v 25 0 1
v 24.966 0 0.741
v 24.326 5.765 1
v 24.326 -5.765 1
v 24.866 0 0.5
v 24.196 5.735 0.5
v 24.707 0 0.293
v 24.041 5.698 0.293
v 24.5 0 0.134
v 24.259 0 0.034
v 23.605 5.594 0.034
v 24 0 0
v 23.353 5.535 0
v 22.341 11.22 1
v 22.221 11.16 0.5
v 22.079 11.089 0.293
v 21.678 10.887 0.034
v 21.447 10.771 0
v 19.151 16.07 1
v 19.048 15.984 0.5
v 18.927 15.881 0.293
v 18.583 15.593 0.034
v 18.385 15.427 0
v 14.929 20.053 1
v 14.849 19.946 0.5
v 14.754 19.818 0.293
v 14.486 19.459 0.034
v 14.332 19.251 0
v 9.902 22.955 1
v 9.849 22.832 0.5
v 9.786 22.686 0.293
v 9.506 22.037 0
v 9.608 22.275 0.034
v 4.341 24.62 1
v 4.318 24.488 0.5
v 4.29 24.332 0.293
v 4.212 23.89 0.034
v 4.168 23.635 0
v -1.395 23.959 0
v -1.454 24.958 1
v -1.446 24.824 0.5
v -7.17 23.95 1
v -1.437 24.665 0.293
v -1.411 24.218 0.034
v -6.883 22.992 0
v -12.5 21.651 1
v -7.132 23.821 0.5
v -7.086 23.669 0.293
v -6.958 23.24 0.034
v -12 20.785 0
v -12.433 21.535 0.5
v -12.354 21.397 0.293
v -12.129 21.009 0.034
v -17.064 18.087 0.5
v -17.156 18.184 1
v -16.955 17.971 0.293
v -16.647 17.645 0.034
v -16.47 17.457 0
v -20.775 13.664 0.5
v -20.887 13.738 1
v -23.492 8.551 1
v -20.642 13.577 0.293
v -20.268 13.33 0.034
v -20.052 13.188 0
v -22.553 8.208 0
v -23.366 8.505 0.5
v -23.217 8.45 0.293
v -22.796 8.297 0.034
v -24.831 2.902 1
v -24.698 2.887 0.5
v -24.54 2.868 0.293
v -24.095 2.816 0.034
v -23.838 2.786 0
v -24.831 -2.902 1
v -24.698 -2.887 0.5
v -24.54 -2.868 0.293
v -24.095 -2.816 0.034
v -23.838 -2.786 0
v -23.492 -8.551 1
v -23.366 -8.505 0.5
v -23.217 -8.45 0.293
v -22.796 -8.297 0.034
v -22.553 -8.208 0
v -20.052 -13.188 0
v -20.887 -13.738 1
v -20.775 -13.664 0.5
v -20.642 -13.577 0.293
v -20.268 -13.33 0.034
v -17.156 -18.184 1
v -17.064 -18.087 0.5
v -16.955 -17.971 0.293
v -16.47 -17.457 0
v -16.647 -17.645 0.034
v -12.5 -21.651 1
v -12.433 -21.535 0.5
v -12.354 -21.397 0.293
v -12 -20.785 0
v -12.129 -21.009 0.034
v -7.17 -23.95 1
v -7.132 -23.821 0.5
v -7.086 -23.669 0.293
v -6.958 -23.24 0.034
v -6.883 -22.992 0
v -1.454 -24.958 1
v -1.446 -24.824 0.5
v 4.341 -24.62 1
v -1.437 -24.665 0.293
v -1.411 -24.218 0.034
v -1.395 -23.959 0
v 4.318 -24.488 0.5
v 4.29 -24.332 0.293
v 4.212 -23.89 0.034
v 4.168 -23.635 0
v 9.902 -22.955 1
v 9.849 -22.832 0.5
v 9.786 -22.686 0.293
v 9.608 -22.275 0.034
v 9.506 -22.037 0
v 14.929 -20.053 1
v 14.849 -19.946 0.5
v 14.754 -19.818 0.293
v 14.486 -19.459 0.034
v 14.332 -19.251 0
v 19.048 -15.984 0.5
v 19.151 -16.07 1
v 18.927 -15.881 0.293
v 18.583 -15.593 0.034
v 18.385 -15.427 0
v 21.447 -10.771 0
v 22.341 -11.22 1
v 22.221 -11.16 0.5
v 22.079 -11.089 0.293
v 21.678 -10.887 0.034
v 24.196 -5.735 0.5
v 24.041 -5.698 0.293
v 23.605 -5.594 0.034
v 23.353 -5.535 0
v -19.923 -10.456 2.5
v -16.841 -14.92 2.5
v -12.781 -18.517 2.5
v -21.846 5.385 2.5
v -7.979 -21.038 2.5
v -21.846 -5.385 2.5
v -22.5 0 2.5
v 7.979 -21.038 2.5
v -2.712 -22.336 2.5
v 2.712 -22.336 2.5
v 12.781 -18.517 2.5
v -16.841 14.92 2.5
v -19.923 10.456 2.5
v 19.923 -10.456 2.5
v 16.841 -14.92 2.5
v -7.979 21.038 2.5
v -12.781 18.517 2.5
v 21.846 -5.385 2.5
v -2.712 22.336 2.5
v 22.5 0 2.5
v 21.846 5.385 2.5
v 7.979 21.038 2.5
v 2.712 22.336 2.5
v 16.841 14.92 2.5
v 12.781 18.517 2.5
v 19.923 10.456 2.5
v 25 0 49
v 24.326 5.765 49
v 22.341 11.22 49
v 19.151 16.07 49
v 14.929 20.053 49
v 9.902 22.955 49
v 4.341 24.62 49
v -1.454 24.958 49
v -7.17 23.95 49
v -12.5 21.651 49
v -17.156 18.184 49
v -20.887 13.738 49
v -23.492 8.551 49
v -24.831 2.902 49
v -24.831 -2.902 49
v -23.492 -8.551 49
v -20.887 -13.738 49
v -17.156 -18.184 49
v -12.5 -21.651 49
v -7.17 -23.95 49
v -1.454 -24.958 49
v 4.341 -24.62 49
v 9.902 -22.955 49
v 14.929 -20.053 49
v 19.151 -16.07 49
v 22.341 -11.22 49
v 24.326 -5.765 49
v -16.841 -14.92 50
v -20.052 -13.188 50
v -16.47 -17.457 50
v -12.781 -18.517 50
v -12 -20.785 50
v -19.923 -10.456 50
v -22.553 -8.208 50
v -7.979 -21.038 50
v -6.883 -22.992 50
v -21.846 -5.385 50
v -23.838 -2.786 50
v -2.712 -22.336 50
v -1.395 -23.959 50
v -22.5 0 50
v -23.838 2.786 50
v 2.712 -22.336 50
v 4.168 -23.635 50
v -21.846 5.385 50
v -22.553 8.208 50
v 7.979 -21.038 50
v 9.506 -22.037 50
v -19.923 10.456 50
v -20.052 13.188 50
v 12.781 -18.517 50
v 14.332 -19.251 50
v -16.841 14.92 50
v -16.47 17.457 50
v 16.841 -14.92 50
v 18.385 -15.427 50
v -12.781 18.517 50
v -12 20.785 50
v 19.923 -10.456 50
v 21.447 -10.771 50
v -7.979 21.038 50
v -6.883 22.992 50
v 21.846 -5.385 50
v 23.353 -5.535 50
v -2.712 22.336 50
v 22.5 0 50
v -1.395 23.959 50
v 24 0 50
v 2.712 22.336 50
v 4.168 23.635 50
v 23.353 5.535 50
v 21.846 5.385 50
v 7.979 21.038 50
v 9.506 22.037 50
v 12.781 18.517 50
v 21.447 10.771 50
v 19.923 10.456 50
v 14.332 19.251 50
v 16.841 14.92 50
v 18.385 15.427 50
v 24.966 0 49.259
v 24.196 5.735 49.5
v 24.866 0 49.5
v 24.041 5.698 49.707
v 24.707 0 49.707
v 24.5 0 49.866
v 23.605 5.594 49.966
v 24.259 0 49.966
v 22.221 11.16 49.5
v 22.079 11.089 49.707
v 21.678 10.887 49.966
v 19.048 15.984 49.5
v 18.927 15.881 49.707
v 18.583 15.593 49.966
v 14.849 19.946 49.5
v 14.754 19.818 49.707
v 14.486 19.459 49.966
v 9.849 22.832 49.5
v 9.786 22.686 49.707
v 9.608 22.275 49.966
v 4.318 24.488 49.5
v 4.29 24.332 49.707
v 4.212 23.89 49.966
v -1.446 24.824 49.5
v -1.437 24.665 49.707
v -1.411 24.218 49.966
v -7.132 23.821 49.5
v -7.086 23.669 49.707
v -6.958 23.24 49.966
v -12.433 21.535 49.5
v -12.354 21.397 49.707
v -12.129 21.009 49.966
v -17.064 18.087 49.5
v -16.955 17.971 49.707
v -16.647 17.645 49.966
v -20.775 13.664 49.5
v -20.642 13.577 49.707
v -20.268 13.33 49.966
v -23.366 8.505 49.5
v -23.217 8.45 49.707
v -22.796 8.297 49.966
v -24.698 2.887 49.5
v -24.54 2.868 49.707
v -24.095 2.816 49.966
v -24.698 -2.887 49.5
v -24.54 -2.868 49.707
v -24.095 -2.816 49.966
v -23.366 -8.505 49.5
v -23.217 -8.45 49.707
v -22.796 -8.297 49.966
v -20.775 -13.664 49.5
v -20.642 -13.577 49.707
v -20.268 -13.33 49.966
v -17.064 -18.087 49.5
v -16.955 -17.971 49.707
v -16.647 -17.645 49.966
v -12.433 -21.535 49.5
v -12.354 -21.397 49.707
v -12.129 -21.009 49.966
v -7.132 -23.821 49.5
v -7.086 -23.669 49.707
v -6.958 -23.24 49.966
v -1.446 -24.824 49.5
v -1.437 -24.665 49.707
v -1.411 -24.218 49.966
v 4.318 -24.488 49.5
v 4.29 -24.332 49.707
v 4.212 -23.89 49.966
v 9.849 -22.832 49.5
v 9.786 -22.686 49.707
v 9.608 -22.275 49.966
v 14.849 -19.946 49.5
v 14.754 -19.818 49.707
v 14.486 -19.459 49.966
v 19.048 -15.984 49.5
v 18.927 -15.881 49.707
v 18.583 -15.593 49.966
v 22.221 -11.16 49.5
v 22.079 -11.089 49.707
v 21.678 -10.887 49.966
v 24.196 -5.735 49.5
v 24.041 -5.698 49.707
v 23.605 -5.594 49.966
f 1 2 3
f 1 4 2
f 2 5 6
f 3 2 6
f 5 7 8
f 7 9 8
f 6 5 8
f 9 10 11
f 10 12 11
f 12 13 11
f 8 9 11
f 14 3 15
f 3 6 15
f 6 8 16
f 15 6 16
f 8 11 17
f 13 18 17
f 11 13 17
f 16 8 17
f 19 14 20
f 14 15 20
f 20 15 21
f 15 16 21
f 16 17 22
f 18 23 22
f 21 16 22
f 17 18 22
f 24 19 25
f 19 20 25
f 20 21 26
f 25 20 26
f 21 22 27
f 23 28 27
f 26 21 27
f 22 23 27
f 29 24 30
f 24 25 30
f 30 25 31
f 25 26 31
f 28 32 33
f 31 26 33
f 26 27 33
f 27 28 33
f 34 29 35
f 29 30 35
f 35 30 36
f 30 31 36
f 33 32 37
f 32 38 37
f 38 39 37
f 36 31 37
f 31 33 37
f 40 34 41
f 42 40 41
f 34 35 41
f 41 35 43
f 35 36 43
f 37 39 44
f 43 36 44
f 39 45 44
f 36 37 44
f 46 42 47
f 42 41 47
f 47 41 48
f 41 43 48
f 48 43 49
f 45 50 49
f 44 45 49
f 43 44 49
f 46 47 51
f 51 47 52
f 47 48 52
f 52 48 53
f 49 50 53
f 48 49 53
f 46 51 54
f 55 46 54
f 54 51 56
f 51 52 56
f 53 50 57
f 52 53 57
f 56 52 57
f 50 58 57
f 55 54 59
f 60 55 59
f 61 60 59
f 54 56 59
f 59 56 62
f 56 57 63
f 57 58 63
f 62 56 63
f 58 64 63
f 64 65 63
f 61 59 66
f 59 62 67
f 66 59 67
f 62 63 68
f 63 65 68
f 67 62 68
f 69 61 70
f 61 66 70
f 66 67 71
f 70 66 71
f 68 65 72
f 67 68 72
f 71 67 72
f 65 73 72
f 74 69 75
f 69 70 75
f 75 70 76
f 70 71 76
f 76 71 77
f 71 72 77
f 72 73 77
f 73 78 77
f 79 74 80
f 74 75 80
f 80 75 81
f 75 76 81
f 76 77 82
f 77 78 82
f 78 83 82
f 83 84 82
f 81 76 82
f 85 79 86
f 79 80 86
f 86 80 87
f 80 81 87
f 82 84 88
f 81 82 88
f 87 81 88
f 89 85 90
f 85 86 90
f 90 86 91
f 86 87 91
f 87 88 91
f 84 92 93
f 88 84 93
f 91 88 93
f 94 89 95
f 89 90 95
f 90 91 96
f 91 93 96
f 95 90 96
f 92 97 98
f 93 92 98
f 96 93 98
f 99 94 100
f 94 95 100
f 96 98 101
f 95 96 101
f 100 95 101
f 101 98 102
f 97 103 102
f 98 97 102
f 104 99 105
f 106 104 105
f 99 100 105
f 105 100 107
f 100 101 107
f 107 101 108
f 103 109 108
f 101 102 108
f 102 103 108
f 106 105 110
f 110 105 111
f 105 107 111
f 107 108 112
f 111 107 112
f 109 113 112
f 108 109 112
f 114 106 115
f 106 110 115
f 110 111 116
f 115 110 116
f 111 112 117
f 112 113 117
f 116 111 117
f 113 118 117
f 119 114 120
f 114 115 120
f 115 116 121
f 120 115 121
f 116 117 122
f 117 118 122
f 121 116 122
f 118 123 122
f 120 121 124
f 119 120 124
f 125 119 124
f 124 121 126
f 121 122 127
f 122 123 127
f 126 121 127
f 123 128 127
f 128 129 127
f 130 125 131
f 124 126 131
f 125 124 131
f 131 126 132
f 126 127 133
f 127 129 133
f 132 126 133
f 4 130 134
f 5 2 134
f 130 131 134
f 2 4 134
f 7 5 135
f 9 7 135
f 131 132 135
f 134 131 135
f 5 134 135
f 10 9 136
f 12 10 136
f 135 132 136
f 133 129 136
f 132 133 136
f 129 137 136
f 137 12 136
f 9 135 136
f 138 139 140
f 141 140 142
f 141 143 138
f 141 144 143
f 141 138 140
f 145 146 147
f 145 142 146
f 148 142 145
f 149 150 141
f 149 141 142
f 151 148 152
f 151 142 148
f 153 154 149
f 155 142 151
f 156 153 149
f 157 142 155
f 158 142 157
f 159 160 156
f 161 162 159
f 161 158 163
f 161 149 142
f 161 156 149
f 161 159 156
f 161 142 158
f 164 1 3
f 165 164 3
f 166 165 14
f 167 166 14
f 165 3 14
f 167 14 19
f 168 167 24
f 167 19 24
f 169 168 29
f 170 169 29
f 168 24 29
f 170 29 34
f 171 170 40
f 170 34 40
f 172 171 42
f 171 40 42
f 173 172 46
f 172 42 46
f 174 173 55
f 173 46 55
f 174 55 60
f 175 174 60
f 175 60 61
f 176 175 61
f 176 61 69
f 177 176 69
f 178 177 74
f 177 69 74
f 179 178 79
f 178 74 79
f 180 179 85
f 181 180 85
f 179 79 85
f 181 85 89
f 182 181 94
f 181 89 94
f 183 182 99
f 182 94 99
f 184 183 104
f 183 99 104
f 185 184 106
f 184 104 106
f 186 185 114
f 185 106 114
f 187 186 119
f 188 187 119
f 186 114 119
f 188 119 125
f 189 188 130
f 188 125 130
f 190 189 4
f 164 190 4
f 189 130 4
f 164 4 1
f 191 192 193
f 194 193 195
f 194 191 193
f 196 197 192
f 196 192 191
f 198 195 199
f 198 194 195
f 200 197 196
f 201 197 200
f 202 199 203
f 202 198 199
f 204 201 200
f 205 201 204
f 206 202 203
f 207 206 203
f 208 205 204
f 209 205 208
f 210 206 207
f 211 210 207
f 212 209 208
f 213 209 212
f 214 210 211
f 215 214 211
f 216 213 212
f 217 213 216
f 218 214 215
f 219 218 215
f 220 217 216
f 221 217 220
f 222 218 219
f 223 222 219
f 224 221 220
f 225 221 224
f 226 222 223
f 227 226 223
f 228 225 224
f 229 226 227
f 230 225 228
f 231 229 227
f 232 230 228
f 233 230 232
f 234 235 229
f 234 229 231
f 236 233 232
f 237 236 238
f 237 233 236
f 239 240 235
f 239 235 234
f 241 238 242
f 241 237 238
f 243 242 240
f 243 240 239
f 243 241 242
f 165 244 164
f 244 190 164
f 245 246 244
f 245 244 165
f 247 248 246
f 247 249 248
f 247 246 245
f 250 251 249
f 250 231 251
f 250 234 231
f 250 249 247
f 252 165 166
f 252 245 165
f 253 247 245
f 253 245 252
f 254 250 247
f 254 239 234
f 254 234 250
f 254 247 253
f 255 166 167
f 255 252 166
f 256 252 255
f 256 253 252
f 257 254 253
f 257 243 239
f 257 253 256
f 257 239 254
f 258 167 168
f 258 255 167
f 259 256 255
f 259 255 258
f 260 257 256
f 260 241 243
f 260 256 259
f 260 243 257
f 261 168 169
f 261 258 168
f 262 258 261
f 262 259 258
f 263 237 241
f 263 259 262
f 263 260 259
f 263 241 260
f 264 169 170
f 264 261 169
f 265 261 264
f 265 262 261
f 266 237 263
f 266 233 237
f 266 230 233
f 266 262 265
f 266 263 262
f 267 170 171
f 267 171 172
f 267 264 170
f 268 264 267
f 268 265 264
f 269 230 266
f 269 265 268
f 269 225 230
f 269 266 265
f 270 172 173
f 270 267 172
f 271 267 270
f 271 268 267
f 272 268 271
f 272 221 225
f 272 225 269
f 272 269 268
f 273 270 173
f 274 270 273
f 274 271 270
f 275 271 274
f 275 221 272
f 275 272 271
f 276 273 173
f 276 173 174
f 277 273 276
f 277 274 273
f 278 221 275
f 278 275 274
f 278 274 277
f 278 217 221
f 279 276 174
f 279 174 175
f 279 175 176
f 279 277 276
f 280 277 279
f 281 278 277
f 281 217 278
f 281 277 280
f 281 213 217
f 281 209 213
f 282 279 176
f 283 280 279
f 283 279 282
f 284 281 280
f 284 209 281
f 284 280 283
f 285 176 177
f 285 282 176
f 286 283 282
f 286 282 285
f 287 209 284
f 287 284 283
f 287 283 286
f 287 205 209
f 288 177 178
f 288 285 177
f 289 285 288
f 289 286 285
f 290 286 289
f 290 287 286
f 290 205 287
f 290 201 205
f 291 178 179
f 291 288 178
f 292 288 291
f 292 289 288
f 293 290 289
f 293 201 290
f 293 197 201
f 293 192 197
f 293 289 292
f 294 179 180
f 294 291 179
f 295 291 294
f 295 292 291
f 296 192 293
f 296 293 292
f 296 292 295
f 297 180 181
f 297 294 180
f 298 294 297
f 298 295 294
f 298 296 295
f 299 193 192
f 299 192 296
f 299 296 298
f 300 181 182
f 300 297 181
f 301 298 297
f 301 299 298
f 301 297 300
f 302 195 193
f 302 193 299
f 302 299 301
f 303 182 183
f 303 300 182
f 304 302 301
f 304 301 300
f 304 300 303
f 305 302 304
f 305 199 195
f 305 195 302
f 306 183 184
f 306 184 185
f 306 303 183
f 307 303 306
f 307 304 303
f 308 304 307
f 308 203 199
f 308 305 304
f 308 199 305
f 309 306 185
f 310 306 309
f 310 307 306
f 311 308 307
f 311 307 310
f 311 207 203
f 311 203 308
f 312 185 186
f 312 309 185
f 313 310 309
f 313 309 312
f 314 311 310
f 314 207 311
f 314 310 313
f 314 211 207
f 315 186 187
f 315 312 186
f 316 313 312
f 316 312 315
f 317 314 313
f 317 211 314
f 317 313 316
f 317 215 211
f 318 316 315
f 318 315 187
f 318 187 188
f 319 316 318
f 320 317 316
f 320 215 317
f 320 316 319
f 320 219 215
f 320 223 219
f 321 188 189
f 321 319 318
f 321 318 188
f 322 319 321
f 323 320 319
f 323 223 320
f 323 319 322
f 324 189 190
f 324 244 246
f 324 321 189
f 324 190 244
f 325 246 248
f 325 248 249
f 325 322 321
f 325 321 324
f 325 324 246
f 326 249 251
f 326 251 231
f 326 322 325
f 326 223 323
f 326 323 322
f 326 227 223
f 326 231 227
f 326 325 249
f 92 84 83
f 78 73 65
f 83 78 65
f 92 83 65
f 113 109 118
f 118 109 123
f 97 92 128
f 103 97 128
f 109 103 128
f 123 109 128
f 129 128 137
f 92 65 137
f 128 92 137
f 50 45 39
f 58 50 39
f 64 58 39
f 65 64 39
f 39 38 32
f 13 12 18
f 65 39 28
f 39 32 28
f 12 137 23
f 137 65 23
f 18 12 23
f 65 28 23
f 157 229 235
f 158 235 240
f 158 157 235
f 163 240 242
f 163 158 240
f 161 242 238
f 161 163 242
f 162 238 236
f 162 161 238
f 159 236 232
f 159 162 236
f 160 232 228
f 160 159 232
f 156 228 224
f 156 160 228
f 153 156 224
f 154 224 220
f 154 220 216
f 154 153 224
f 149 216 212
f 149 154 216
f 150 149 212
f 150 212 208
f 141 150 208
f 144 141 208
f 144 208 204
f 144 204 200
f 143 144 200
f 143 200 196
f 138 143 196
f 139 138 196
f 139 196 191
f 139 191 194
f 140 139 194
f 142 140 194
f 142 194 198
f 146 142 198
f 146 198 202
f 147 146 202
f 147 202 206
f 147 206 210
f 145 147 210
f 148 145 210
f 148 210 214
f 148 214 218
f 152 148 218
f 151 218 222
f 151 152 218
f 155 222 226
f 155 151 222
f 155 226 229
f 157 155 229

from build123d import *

# Parameters (mm, degrees)
F0_R     = 25
F1_DEPTH = 50
F2_T     = -2.5
F3_R     = 1


with BuildPart() as f1:
    # F0 (on Top) → F1 (new body)
    with BuildSketch(Plane.XY):
        Circle(F0_R)
    extrude(amount=F1_DEPTH)

    # F2
    f2_openings = [f1.faces().sort_by_distance(p)[0] for p in [
        (0, 0, 50),
    ]]
    offset(amount=F2_T, openings=f2_openings)

    # F3
    f3_edges = [f1.edges().sort_by_distance(p)[0] for p in [
        (25, 0, 25),
        (-25, 0, 0),
        (-25, 0, 50),
    ]]
    fillet(f3_edges, radius=F3_R)


solid = f1.part
